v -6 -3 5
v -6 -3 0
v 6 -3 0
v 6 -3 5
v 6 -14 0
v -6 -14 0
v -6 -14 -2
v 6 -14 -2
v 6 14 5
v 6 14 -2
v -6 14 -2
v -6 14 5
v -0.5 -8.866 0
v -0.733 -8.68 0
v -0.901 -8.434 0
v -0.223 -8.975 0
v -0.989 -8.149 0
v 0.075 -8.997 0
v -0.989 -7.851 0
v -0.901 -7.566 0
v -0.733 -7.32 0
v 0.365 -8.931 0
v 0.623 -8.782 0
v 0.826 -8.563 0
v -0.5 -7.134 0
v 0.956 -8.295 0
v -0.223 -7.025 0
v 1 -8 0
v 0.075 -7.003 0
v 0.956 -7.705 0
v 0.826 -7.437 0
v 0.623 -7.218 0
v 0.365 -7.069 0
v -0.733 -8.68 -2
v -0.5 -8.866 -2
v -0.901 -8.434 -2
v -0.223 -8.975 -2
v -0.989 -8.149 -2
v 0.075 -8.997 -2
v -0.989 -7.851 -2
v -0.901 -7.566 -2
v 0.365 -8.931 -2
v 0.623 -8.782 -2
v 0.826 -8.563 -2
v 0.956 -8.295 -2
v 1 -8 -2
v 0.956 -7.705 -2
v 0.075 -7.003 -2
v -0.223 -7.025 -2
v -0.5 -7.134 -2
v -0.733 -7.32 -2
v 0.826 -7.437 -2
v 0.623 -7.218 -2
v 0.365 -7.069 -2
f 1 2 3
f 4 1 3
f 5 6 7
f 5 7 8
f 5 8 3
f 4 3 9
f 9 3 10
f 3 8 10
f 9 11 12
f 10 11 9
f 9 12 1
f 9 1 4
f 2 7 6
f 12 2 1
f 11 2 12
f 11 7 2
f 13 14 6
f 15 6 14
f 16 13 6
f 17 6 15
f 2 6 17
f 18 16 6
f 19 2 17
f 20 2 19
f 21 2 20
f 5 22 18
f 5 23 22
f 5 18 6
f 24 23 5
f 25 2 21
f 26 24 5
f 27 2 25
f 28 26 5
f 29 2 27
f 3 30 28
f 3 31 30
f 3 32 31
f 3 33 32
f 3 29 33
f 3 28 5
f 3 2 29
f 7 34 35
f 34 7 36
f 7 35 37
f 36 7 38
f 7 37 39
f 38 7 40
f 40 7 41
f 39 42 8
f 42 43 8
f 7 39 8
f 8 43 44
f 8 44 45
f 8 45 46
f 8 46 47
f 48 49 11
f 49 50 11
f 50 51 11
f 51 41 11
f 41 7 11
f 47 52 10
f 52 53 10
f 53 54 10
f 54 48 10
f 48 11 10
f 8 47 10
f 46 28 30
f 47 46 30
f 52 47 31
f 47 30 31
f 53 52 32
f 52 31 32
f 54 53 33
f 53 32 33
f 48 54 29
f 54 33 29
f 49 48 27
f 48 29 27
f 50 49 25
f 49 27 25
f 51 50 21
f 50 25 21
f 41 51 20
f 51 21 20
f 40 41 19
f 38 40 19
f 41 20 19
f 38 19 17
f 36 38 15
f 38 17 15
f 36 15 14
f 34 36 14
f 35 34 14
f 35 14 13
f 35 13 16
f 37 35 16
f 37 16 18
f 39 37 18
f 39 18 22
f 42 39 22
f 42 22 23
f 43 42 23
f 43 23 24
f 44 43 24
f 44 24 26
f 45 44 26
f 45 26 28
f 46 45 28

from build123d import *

# Parameters (mm, degrees)
SKETCH_1_W          = 12
SKETCH_1_H          = 28
EXTRUDE_1_DEPTH     = 2
SKETCH_2_W          = 12
SKETCH_2_H          = 17
EXTRUDE_2_DEPTH     = 5
CUT_EXTRUDE_1_REACH = 18.031
SKETCH_3_R          = 1


with BuildPart() as part:
    # 草图1 → 凸台-拉伸1 (new body)
    with BuildSketch(Plane.XY):
        Rectangle(SKETCH_1_W, SKETCH_1_H)
    extrude(amount=-EXTRUDE_1_DEPTH)

    # 草图2 → 凸台-拉伸2 (add)
    with BuildSketch(Plane.XY):
        with Locations((0, 5.5)):
            Rectangle(SKETCH_2_W, SKETCH_2_H)
    extrude(amount=EXTRUDE_2_DEPTH)

    # 草图3 → 切除-拉伸1 (cut, up to next)
    with BuildSketch(Plane.XY, mode=Mode.PRIVATE) as cut_extrude_1_sk1:
        with Locations((0, -8)):
            Circle(SKETCH_3_R)
    cut_extrude_1_tool1 = extrude(cut_extrude_1_sk1.sketch, amount=-CUT_EXTRUDE_1_REACH, mode=Mode.PRIVATE) & part.part
    add(cut_extrude_1_tool1.solids().sort_by_distance((0, -8, 0))[0], mode=Mode.SUBTRACT)


solid = part.part
